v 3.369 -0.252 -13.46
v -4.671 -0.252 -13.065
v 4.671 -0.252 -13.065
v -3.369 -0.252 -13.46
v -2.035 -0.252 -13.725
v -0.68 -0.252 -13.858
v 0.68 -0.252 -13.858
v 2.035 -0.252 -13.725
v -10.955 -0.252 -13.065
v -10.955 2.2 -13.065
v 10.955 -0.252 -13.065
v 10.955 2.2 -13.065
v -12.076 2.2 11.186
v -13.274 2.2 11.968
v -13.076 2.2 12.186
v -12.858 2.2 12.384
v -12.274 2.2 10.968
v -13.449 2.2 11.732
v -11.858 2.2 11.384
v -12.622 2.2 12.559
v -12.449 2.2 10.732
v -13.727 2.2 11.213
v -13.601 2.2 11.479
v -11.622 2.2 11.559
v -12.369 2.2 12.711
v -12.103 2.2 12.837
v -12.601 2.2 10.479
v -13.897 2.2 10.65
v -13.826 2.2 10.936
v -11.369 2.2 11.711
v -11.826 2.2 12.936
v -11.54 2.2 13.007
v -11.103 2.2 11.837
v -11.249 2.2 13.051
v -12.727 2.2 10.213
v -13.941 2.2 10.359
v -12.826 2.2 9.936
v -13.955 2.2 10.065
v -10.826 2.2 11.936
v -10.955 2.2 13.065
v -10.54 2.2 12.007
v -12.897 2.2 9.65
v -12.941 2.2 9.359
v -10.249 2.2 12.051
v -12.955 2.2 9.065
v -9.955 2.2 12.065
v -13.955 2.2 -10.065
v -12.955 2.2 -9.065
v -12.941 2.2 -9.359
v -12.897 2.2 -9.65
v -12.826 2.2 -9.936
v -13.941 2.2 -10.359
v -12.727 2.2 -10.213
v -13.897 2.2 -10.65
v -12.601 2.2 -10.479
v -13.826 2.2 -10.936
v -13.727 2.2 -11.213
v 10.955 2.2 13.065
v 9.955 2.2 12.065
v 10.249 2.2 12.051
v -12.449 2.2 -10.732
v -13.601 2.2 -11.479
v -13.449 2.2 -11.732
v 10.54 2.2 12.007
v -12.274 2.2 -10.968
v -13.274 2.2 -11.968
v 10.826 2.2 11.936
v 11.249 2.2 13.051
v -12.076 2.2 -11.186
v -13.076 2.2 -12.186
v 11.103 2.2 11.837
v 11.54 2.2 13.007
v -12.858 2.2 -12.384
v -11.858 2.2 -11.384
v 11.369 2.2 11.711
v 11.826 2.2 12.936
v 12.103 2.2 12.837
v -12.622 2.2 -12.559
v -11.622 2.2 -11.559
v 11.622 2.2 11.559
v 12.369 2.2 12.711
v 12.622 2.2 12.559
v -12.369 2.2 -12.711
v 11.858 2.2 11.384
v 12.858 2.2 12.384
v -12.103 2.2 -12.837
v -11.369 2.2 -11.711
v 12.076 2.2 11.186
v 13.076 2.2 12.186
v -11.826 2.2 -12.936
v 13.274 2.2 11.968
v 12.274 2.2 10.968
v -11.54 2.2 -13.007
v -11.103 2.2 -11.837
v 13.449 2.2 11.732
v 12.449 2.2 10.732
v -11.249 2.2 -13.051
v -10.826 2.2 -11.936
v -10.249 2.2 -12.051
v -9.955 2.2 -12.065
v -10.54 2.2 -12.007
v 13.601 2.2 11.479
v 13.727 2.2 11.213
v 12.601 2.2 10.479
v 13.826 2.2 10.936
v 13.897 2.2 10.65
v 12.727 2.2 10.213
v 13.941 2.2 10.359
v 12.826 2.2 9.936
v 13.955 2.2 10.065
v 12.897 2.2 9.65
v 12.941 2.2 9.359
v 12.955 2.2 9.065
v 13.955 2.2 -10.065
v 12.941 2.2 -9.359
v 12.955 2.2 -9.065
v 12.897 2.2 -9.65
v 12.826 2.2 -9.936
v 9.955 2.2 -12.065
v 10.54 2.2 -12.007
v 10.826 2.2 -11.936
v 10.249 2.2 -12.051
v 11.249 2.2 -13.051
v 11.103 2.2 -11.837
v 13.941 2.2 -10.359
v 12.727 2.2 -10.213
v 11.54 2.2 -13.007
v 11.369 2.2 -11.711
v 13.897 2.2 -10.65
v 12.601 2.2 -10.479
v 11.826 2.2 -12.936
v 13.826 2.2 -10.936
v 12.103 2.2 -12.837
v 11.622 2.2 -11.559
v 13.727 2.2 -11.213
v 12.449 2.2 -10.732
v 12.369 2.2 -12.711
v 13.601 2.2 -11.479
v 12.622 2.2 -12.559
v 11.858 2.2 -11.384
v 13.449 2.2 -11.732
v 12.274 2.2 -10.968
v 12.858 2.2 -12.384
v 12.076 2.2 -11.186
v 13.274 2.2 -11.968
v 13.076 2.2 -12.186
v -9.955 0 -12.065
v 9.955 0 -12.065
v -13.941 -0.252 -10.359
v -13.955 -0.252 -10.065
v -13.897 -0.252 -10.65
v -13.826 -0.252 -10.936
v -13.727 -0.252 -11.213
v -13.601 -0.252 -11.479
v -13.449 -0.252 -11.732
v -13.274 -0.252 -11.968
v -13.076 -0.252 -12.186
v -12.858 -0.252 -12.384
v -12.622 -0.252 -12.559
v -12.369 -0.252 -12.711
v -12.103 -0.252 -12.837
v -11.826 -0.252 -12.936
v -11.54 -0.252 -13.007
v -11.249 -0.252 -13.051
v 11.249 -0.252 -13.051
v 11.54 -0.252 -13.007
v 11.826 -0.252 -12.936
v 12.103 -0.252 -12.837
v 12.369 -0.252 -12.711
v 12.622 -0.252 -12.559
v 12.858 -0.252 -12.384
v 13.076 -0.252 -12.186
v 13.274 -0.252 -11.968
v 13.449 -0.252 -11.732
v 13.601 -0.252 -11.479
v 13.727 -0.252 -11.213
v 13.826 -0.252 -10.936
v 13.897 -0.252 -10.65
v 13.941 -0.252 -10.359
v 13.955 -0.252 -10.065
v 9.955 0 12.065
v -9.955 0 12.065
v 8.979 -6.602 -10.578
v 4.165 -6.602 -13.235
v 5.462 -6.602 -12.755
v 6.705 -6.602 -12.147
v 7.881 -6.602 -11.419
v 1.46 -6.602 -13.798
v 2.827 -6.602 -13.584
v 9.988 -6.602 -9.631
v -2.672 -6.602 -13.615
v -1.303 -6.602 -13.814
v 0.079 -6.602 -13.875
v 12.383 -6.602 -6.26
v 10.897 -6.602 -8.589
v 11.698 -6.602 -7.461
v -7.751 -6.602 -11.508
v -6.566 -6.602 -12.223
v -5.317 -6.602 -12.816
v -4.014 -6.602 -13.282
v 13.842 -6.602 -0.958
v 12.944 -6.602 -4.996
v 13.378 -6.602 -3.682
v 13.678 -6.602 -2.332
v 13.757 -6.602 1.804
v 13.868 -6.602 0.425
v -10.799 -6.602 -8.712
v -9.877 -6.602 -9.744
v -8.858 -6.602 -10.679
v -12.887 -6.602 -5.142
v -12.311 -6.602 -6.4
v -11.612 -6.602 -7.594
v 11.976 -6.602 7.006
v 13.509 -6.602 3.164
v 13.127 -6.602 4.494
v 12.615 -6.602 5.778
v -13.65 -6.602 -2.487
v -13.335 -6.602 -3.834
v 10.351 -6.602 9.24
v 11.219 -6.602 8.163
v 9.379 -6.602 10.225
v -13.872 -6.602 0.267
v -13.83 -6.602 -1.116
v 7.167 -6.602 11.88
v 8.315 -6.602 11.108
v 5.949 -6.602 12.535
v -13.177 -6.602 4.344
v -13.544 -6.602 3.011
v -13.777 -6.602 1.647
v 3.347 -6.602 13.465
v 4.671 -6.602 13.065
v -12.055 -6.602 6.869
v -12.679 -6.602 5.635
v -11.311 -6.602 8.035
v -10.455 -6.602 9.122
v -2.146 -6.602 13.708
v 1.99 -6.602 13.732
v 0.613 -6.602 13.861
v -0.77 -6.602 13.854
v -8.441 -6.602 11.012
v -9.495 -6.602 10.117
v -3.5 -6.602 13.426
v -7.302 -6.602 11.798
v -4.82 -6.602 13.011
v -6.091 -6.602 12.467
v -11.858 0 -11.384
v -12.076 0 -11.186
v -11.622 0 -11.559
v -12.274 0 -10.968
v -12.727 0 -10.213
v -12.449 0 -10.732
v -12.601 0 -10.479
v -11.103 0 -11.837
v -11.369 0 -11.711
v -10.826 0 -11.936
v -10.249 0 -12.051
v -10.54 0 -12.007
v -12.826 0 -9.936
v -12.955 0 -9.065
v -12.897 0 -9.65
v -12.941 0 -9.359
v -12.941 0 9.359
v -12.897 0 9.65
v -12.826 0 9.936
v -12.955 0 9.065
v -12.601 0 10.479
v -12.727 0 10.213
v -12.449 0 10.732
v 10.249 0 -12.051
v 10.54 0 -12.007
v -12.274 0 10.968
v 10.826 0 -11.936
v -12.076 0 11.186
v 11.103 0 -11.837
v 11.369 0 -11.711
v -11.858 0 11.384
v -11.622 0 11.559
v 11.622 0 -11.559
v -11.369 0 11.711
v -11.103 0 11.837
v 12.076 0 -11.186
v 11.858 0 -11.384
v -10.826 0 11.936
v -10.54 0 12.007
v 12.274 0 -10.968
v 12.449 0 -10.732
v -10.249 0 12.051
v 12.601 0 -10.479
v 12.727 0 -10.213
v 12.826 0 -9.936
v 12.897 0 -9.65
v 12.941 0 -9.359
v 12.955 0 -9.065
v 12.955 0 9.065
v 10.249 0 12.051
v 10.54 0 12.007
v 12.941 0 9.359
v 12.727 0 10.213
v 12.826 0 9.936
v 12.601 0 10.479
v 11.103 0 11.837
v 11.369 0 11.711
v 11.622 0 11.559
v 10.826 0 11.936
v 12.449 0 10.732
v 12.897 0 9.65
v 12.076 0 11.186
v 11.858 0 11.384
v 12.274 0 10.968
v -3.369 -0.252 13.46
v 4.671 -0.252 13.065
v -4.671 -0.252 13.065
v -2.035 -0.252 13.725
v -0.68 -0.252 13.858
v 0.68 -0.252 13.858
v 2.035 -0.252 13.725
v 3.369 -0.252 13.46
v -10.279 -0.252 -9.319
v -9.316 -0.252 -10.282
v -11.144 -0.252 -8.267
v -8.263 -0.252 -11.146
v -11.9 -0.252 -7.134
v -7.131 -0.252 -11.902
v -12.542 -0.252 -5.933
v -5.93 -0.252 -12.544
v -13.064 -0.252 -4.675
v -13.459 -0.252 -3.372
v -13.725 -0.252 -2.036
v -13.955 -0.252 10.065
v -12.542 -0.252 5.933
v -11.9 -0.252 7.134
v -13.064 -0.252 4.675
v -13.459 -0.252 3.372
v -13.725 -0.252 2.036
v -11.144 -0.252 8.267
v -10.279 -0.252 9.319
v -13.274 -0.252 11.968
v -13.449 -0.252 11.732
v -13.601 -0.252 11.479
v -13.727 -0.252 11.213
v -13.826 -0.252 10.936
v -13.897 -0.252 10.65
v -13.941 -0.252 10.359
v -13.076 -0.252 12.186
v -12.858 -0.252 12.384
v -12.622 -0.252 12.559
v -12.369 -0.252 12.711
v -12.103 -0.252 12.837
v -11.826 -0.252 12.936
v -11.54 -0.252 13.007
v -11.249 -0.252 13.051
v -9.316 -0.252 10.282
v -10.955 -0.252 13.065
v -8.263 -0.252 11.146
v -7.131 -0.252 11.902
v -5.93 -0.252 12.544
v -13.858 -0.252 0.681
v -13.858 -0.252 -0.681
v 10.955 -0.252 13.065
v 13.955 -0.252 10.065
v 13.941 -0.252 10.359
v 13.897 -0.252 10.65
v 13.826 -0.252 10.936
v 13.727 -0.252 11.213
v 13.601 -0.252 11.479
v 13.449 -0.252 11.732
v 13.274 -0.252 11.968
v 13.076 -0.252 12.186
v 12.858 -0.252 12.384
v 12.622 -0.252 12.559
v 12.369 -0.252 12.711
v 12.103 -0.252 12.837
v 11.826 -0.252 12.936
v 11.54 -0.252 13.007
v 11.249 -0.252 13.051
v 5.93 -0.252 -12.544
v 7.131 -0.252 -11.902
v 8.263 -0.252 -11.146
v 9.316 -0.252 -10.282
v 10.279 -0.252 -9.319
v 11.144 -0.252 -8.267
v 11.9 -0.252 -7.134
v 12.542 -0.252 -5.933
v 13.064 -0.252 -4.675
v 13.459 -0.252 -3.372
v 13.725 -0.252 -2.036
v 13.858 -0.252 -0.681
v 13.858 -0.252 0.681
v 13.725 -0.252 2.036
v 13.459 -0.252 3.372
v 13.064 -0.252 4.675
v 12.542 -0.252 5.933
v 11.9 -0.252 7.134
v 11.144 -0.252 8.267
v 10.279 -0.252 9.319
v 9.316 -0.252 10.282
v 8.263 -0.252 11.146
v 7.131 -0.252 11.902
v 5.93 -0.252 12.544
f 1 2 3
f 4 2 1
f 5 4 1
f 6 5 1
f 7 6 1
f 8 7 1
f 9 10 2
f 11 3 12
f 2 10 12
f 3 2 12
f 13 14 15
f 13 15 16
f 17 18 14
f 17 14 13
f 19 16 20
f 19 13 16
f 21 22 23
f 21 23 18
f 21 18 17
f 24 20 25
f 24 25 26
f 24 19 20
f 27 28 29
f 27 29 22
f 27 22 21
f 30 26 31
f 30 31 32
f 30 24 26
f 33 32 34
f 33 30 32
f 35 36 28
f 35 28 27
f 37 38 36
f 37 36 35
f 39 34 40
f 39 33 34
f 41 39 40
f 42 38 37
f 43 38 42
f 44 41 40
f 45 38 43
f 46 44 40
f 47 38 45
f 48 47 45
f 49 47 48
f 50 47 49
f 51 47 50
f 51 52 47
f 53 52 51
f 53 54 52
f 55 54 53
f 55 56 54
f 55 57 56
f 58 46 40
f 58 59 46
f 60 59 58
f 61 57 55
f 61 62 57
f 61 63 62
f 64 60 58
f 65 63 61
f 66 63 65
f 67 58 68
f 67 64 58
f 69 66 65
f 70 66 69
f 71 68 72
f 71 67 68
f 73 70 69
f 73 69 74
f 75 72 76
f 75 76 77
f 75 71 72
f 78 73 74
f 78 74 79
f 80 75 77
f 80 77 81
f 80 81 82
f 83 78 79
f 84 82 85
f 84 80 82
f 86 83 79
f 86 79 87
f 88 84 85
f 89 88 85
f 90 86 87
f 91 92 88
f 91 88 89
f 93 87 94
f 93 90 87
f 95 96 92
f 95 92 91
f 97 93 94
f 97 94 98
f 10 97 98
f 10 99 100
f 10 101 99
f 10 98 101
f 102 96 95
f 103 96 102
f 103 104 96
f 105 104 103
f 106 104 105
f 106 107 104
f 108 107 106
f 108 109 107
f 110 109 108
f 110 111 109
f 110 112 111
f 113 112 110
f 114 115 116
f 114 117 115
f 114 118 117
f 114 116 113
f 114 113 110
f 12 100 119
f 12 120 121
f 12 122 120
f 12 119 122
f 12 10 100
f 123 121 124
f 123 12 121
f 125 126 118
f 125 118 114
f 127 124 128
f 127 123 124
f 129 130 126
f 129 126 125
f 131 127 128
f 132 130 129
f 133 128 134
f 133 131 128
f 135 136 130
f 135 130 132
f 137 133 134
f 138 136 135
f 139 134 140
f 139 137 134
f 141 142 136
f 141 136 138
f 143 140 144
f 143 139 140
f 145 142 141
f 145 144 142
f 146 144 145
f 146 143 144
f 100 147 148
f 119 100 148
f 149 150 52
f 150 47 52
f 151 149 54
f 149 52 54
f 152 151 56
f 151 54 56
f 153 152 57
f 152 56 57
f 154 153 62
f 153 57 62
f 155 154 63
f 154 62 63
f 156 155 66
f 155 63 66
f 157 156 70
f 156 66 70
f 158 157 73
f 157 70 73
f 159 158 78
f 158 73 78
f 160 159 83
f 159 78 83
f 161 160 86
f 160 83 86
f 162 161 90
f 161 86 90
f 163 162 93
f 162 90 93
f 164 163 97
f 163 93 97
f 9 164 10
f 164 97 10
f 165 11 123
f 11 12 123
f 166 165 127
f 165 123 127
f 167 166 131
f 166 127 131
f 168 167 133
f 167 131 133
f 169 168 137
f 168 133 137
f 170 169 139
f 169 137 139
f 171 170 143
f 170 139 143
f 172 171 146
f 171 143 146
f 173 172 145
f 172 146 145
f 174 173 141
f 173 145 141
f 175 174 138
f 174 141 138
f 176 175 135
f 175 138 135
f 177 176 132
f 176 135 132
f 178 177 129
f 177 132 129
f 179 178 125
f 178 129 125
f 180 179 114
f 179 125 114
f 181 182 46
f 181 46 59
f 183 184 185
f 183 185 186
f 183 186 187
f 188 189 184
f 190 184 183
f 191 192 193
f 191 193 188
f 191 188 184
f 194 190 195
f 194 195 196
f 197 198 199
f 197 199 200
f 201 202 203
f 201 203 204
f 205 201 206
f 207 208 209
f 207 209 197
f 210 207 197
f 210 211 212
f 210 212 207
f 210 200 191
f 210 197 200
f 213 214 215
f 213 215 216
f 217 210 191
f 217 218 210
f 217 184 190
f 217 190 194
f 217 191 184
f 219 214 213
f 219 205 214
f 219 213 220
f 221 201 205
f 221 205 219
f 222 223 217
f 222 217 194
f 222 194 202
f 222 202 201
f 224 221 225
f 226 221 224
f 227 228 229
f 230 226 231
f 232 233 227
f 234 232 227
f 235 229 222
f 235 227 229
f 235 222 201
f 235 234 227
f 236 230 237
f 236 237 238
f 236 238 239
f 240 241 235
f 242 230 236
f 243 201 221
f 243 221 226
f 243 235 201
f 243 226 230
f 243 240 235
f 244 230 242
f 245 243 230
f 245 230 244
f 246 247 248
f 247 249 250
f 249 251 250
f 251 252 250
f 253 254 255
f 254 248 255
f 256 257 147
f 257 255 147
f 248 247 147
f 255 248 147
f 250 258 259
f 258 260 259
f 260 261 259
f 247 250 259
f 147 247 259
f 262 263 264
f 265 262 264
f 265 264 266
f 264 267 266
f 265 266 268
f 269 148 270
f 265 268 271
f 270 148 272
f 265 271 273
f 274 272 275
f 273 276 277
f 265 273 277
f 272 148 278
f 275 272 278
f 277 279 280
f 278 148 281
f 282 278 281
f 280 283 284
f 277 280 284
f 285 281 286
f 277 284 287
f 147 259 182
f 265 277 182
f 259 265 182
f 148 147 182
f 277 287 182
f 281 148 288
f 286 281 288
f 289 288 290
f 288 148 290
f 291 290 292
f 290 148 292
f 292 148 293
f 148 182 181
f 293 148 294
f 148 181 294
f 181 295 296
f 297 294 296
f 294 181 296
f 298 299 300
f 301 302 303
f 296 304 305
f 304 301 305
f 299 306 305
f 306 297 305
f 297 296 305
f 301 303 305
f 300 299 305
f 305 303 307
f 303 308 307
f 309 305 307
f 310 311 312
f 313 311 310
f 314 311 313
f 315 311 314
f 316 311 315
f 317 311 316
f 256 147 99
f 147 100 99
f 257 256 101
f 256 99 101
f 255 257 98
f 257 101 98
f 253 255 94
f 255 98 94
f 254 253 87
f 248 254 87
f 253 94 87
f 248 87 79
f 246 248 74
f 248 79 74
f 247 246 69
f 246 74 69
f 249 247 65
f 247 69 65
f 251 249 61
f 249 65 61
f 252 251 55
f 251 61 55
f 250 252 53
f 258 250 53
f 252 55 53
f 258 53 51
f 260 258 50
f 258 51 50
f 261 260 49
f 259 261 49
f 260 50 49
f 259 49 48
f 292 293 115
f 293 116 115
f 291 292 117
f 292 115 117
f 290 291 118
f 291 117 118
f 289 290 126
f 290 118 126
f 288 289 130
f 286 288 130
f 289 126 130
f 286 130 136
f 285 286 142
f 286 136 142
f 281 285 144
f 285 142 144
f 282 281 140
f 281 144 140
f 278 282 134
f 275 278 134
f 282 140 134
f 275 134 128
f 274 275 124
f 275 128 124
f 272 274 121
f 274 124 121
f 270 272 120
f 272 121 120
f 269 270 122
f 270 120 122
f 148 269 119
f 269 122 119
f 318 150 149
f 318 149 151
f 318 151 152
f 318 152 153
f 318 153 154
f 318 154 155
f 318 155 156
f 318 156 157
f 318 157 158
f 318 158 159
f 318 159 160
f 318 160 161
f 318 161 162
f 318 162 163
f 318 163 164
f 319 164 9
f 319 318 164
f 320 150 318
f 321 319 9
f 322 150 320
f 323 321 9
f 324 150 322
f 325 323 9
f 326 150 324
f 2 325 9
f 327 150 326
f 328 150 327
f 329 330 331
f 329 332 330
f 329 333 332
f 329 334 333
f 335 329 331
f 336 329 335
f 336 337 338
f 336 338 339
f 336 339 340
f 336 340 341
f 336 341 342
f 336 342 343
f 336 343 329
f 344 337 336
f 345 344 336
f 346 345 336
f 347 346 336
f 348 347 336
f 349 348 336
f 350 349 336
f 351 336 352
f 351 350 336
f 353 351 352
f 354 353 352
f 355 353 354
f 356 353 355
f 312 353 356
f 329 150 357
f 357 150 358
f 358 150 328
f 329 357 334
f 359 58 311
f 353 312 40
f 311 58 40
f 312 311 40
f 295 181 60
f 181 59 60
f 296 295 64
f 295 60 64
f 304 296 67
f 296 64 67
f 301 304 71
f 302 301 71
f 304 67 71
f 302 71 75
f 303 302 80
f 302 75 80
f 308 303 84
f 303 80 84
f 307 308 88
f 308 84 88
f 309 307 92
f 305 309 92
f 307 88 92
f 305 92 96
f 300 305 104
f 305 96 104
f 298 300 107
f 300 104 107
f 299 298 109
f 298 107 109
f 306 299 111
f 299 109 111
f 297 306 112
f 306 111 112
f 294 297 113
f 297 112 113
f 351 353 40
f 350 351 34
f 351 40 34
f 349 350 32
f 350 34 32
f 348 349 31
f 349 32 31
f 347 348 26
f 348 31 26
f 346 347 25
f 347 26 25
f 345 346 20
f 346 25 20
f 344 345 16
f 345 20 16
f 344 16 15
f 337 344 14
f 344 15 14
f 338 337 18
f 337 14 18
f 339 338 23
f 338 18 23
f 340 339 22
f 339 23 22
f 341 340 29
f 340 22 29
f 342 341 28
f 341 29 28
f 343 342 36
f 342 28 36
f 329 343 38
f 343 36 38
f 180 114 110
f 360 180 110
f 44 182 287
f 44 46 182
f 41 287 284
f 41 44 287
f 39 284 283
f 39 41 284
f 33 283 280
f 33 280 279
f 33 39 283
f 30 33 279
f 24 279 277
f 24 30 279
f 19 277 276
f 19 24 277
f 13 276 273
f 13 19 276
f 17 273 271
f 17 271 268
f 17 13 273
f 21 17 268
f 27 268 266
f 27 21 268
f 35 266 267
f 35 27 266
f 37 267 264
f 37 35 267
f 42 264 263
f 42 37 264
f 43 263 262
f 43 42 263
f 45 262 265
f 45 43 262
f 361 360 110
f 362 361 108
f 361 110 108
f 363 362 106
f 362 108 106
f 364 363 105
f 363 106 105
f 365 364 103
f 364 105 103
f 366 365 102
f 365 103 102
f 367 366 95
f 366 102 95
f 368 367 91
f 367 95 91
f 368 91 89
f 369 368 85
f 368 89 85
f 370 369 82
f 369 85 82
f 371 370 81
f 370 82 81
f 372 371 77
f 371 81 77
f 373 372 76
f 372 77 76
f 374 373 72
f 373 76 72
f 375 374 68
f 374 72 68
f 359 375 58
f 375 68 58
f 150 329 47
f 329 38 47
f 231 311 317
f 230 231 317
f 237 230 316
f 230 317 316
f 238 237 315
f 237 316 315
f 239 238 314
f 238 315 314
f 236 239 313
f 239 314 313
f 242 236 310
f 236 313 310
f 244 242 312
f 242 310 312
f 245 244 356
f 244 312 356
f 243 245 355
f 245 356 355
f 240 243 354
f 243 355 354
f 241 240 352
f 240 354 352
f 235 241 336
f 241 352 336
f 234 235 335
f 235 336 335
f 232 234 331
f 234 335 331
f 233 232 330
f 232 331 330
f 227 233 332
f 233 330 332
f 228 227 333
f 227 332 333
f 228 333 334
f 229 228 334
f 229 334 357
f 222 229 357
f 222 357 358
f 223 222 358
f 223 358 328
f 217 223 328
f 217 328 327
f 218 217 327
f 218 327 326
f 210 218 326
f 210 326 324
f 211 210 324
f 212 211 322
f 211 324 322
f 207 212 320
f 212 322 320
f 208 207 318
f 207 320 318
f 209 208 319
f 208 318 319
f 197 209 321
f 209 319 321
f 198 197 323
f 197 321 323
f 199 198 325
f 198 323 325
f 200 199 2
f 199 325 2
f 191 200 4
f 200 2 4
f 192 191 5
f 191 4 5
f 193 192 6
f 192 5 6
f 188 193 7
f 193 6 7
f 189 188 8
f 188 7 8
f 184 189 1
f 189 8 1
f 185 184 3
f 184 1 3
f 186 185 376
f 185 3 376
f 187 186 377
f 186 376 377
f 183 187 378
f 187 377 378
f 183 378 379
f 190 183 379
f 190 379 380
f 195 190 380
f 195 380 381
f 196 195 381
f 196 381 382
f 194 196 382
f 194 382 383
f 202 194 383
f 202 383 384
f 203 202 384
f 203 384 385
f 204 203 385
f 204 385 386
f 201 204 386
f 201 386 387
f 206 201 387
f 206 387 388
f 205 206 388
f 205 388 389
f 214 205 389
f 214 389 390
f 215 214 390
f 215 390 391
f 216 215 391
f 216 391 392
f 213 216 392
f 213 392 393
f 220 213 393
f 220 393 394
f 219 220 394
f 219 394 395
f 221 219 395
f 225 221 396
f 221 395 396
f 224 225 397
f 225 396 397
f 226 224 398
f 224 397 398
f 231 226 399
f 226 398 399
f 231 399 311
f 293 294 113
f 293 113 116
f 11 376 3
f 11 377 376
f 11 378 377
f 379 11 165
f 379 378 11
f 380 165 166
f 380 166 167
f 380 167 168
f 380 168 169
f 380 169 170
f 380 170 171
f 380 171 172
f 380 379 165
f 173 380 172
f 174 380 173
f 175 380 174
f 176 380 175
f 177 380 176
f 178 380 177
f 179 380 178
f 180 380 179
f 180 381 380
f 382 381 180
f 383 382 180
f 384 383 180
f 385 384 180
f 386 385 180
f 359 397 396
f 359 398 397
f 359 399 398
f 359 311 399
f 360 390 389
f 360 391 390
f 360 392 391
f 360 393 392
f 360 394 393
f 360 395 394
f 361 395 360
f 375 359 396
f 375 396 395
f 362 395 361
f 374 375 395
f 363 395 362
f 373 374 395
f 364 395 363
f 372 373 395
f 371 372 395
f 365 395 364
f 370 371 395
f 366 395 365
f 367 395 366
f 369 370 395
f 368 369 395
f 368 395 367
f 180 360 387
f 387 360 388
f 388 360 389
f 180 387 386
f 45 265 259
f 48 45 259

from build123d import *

# Parameters (mm, degrees)
IZIM1_W                     = 27.91
IZIM1_H                     = 26.13
IZIM1_W_2                   = 25.91
IZIM1_H_2                   = 24.13
Y_KSEKLIK_EKSTR_ZYON1_DEPTH = 2.2
RADYUS1_R                   = 3
Y_KSEKLIK_EKSTR_ZYON2_DEPTH = 0.252
IZIM3_R                     = 13.875
Y_KSEKLIK_EKSTR_ZYON3_DEPTH = 6.35


with BuildPart() as part:
    # Çizim1 → Yükseklik-Ekstrüzyon1 (new body)
    with BuildSketch(Plane(origin=(0, 0, 0), x_dir=(1, 0, 0), z_dir=(0, 1, 0))):
        Rectangle(IZIM1_W, IZIM1_H)
        Rectangle(IZIM1_W_2, IZIM1_H_2, mode=Mode.SUBTRACT)
    extrude(amount=Y_KSEKLIK_EKSTR_ZYON1_DEPTH)

    # Radyus1
    radyus1_edges = [part.edges().sort_by_distance(p)[0] for p in [
        (12.955, 1.1, 12.065),
        (12.955, 1.1, -12.065),
        (-12.955, 1.1, -12.065),
        (-12.955, 1.1, 12.065),
        (-13.955, 1.1, -13.065),
        (13.955, 1.1, -13.065),
        (13.955, 1.1, 13.065),
        (-13.955, 1.1, 13.065),
    ]]
    fillet(radyus1_edges, radius=RADYUS1_R)

    # Çizim2 → Yükseklik-Ekstrüzyon2 (add)
    with BuildSketch(Plane.XZ):
        with BuildLine():
            Line((10.955, 13.065), (-10.955, 13.065))
            ThreePointArc((-10.955, 13.065), (-13.076320344, 12.186320344), (-13.955, 10.065))
            Line((-13.955, 10.065), (-13.955, -10.065))
            ThreePointArc((-13.955, -10.065), (-13.076320344, -12.186320344), (-10.955, -13.065))
            Line((-10.955, -13.065), (10.955, -13.065))
            ThreePointArc((10.955, -13.065), (13.076320344, -12.186320344), (13.955, -10.065))
            Line((13.955, -10.065), (13.955, 10.065))
            ThreePointArc((13.955, 10.065), (13.076320344, 12.186320344), (10.955, 13.065))
        make_face()
    extrude(amount=Y_KSEKLIK_EKSTR_ZYON2_DEPTH)

    # Çizim3 → Yükseklik-Ekstrüzyon3 (add)
    with BuildSketch(Plane.XZ.offset(0.252)):
        with Locations(Location((0, 0, 0), (0, 0, 70.325694482))):
            Circle(IZIM3_R)
    extrude(amount=Y_KSEKLIK_EKSTR_ZYON3_DEPTH)


solid = part.part
